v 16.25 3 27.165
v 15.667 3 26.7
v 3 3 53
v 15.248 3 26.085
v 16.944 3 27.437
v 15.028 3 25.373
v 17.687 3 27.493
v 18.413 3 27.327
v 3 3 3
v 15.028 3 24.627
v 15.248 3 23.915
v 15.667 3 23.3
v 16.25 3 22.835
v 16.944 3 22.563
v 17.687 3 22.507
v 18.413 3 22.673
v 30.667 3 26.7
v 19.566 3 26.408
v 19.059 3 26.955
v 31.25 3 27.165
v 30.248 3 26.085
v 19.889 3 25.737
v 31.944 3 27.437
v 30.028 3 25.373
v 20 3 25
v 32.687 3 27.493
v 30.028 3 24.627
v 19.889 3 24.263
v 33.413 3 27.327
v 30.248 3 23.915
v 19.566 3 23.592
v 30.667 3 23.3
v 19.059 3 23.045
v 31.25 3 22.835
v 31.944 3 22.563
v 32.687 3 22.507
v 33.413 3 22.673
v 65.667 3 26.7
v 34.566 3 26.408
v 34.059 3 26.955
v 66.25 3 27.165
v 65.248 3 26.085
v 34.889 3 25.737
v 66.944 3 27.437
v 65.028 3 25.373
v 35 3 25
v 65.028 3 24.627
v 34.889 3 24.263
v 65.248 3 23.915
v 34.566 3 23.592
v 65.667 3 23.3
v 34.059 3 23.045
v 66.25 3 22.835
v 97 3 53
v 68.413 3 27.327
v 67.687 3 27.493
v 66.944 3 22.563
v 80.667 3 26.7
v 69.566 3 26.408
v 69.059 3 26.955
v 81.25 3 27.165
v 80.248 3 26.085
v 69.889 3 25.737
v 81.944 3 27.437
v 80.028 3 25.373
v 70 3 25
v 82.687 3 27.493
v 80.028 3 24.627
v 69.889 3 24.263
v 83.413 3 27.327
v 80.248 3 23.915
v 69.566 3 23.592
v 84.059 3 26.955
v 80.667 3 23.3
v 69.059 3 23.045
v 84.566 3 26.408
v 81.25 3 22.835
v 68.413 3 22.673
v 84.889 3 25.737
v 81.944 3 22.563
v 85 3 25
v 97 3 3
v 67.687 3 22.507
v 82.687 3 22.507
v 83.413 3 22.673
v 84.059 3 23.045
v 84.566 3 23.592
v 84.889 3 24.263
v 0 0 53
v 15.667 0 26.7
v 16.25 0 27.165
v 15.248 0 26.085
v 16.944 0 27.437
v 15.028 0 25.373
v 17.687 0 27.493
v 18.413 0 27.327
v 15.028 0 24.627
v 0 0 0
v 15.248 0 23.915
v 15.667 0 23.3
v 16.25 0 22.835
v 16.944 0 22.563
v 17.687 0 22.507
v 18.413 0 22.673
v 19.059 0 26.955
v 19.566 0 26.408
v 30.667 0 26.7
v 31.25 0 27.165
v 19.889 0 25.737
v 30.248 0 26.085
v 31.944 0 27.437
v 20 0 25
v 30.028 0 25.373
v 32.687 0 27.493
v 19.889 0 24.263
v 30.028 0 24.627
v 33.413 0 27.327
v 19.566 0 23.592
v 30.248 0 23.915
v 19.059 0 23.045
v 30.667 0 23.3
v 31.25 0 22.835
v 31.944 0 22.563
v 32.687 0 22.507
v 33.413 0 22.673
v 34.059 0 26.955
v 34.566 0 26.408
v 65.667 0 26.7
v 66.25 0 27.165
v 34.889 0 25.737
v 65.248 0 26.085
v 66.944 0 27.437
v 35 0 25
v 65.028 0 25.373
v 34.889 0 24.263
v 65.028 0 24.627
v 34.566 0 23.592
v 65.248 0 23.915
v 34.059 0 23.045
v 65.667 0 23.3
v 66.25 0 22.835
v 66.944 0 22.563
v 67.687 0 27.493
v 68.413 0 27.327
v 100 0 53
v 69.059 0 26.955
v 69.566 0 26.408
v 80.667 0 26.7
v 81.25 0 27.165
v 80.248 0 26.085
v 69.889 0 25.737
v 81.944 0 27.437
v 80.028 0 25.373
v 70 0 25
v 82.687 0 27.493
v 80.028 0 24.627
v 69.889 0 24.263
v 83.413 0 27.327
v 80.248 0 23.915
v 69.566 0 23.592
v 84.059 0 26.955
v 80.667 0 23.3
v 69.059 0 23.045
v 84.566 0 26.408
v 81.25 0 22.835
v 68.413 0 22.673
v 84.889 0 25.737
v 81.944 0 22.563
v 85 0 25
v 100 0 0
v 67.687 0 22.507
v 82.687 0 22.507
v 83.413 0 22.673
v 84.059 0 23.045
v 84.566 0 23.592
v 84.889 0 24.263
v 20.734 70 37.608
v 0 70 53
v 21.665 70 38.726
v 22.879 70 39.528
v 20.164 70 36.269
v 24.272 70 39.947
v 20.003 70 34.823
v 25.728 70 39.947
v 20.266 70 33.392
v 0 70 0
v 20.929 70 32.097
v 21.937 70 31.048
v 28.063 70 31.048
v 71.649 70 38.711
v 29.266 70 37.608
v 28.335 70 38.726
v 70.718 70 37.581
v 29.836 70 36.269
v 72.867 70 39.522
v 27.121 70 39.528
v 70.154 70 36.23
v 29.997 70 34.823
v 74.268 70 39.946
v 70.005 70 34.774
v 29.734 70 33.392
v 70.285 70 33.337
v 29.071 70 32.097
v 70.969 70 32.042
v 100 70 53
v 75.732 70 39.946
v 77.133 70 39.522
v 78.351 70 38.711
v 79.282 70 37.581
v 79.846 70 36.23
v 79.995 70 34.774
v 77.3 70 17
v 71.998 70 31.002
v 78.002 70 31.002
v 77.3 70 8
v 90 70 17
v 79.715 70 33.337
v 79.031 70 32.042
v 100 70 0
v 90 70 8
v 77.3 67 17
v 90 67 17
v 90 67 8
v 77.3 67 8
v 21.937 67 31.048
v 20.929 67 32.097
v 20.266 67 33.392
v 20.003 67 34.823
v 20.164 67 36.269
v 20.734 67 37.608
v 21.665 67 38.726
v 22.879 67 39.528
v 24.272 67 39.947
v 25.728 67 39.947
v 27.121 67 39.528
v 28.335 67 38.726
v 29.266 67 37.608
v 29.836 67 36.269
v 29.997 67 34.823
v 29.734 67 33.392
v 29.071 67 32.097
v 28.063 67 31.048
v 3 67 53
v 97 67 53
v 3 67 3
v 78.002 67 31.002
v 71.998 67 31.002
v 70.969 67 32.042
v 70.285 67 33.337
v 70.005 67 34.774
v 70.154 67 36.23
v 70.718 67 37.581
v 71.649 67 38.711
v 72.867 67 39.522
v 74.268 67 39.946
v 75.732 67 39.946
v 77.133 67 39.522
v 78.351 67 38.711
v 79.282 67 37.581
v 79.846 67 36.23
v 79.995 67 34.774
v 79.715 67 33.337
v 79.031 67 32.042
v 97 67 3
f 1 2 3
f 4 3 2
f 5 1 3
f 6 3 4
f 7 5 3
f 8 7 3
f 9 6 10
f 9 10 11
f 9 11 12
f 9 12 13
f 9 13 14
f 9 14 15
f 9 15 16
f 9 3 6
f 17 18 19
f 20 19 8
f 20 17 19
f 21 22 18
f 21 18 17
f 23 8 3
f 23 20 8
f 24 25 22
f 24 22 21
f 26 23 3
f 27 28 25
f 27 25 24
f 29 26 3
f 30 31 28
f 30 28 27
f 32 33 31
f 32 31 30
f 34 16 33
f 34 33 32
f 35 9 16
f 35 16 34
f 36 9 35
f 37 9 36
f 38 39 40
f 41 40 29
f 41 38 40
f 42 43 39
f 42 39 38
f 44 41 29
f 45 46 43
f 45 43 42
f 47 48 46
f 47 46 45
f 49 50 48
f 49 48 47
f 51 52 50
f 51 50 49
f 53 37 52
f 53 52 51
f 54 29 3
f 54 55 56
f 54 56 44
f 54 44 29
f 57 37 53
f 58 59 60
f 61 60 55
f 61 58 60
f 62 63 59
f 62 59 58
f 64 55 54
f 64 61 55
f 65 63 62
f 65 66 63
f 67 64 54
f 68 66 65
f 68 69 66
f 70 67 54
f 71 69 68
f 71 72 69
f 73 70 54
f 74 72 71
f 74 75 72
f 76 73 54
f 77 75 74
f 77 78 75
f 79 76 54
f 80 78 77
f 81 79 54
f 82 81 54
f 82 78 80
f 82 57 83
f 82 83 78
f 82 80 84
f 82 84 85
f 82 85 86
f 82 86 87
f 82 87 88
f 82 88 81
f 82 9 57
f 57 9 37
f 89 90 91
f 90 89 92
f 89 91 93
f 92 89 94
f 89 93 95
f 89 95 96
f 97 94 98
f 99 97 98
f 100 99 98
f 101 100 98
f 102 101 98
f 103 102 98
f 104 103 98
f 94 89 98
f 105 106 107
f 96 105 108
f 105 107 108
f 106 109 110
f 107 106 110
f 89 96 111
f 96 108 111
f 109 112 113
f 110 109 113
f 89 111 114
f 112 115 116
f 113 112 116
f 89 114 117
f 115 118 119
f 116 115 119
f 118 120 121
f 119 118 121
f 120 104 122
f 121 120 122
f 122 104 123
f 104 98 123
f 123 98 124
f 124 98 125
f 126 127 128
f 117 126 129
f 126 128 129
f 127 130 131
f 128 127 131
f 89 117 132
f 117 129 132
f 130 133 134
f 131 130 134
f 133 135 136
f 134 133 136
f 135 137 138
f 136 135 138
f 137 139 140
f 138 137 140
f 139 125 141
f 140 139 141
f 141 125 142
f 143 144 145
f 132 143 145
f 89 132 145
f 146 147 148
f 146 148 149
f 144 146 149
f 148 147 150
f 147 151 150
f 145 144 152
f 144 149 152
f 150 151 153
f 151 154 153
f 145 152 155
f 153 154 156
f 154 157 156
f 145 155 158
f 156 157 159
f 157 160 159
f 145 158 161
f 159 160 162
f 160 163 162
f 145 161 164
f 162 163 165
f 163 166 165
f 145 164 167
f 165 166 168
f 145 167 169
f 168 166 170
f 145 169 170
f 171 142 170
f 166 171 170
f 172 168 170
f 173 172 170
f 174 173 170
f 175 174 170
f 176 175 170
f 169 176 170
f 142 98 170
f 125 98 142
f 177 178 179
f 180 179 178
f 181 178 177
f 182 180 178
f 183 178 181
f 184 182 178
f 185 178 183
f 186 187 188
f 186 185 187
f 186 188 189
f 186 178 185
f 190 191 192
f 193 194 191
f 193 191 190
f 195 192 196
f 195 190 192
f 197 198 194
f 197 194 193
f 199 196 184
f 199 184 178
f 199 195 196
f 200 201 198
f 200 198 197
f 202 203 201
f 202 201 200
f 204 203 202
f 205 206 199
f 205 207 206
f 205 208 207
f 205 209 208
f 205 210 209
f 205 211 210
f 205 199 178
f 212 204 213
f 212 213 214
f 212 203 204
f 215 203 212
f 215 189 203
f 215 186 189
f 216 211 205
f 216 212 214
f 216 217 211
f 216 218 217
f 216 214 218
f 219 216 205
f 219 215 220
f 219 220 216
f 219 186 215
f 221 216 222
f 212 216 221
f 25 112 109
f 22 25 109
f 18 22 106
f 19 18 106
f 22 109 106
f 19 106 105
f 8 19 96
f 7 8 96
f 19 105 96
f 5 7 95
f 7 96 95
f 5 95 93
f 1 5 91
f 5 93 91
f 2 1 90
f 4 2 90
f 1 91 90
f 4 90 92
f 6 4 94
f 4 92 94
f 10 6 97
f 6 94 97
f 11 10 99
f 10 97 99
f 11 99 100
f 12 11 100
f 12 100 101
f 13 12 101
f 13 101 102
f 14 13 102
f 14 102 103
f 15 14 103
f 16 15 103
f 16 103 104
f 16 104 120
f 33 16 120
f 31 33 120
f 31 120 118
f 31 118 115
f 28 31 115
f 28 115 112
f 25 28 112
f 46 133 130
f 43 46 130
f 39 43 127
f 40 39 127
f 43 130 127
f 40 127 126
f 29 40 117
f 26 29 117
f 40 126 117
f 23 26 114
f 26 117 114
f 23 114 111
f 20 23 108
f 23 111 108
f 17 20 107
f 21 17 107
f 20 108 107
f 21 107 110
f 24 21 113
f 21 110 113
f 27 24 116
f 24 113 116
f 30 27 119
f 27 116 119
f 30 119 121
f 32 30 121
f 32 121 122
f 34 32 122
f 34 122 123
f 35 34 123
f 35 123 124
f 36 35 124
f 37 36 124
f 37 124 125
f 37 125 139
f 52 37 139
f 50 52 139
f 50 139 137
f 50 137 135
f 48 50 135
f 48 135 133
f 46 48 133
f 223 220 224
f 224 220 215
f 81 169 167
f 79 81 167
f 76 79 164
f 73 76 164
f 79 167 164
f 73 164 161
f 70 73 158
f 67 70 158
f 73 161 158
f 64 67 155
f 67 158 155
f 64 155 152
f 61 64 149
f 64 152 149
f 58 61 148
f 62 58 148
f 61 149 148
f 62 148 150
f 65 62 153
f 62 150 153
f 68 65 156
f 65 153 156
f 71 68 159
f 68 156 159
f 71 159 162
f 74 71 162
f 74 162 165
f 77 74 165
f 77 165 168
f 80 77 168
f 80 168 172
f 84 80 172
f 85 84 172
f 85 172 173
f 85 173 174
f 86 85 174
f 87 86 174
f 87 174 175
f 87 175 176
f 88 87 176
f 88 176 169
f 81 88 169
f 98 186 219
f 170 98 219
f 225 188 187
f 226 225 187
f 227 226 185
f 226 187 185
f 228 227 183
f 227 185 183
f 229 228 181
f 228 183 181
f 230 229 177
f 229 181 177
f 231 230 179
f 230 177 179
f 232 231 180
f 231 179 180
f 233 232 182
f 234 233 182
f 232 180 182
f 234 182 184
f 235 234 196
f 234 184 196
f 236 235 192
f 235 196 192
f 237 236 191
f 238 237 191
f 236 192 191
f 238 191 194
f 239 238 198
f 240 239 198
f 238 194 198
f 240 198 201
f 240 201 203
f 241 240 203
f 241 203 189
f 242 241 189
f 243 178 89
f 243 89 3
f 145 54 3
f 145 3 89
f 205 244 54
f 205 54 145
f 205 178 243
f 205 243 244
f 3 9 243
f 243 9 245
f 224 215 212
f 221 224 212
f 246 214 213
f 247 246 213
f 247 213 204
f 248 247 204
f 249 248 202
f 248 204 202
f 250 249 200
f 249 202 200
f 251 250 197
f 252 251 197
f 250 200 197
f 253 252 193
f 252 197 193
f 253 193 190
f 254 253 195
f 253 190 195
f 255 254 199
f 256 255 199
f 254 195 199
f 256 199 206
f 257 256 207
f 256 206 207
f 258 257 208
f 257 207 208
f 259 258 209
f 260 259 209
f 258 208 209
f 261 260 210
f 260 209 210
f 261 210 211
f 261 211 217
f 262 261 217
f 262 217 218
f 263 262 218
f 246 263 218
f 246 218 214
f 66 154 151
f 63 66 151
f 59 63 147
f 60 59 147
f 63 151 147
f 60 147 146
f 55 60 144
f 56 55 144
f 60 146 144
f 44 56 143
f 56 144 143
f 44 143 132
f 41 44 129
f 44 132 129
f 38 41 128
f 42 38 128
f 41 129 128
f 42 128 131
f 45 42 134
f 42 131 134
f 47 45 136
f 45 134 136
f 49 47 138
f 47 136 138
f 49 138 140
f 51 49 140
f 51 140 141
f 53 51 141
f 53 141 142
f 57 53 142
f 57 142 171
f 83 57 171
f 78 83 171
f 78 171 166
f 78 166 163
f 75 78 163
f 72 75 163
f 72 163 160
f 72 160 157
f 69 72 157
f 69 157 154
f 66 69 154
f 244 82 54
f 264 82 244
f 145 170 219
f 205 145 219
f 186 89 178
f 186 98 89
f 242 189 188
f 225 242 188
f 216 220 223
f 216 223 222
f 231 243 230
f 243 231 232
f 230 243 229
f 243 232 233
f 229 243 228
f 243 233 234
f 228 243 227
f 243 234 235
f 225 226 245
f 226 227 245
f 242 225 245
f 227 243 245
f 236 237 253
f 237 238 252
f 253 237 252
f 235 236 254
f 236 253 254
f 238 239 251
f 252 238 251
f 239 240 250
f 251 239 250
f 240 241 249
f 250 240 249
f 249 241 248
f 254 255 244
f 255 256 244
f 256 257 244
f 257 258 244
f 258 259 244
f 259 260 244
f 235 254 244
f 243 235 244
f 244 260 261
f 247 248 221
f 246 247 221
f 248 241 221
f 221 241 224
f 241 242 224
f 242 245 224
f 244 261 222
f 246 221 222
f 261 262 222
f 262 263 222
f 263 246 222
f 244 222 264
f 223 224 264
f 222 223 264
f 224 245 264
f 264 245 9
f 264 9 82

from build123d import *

# Parameters (mm, degrees)
SKETCH_W        = 100
SKETCH_H        = 70
PAD_DEPTH       = 3
SKETCH001_W     = 100
SKETCH001_H     = 3
PAD001_DEPTH    = 50
SKETCH002_W     = 3
SKETCH002_H     = 70
PAD002_DEPTH    = 50
POCKET_DEPTH    = 4
SKETCH004_R     = 2.5
POCKET001_DEPTH = 4
SKETCH005_W     = 12.7
SKETCH005_H     = 9
POCKET002_DEPTH = 4


with BuildPart() as part:
    # Sketch → Pad (new body)
    with BuildSketch(Plane.XY):
        with Locations((50, 35)):
            Rectangle(SKETCH_W, SKETCH_H)
    extrude(amount=PAD_DEPTH)

    # Sketch001 (on Face6 of Pad) → Pad001 (join)
    with BuildSketch(Plane.XY.offset(3)):
        with Locations((50, 68.5)):
            Rectangle(SKETCH001_W, SKETCH001_H)
        with Locations((50, 1.5)):
            Rectangle(SKETCH001_W, SKETCH001_H)
    extrude(amount=PAD001_DEPTH)

    # Sketch002 (on Face8 of Pad001) → Pad002 (join)
    with BuildSketch(Plane.XY.offset(3)):
        with Locations((1.5, 35)):
            Rectangle(SKETCH002_W, SKETCH002_H)
        with Locations((98.5, 35)):
            Rectangle(SKETCH002_W, SKETCH002_H)
    extrude(amount=PAD002_DEPTH)

    # Sketch003 (on Face6 of Pad002) → Pocket (cut)
    with BuildSketch(Plane(origin=(0, 70, 0), x_dir=(-1, 0, 0), z_dir=(0, 1, 0))):
        with BuildLine():
            ThreePointArc((-71.997929, 31.001554), (-75, 40), (-78.002071, 31.001554))
            Line((-78.002071, 31.001554), (-71.997929, 31.001554))
        make_face()
        with BuildLine():
            ThreePointArc((-21.937304, 31.047799), (-25, 40), (-28.062696, 31.047799))
            Line((-28.062696, 31.047799), (-21.937304, 31.047799))
        make_face()
    extrude(amount=-POCKET_DEPTH, mode=Mode.SUBTRACT)

    # Sketch004 (on Face23 of Pocket) → Pocket001 (cut)
    with BuildSketch(Plane.XZ):
        with Locations((17.5, 25)):
            Circle(SKETCH004_R)
        with Locations((32.5, 25)):
            Circle(SKETCH004_R)
        with Locations((67.5, 25)):
            Circle(SKETCH004_R)
        with Locations((82.5, 25)):
            Circle(SKETCH004_R)
    extrude(amount=-POCKET001_DEPTH, mode=Mode.SUBTRACT)

    # Sketch005 (on Face6 of Pocket001) → Pocket002 (cut)
    with BuildSketch(Plane(origin=(0, 70, 0), x_dir=(-1, 0, 0), z_dir=(0, 1, 0))):
        with Locations((-83.65, 12.5)):
            Rectangle(SKETCH005_W, SKETCH005_H)
    extrude(amount=-POCKET002_DEPTH, mode=Mode.SUBTRACT)


solid = part.part
